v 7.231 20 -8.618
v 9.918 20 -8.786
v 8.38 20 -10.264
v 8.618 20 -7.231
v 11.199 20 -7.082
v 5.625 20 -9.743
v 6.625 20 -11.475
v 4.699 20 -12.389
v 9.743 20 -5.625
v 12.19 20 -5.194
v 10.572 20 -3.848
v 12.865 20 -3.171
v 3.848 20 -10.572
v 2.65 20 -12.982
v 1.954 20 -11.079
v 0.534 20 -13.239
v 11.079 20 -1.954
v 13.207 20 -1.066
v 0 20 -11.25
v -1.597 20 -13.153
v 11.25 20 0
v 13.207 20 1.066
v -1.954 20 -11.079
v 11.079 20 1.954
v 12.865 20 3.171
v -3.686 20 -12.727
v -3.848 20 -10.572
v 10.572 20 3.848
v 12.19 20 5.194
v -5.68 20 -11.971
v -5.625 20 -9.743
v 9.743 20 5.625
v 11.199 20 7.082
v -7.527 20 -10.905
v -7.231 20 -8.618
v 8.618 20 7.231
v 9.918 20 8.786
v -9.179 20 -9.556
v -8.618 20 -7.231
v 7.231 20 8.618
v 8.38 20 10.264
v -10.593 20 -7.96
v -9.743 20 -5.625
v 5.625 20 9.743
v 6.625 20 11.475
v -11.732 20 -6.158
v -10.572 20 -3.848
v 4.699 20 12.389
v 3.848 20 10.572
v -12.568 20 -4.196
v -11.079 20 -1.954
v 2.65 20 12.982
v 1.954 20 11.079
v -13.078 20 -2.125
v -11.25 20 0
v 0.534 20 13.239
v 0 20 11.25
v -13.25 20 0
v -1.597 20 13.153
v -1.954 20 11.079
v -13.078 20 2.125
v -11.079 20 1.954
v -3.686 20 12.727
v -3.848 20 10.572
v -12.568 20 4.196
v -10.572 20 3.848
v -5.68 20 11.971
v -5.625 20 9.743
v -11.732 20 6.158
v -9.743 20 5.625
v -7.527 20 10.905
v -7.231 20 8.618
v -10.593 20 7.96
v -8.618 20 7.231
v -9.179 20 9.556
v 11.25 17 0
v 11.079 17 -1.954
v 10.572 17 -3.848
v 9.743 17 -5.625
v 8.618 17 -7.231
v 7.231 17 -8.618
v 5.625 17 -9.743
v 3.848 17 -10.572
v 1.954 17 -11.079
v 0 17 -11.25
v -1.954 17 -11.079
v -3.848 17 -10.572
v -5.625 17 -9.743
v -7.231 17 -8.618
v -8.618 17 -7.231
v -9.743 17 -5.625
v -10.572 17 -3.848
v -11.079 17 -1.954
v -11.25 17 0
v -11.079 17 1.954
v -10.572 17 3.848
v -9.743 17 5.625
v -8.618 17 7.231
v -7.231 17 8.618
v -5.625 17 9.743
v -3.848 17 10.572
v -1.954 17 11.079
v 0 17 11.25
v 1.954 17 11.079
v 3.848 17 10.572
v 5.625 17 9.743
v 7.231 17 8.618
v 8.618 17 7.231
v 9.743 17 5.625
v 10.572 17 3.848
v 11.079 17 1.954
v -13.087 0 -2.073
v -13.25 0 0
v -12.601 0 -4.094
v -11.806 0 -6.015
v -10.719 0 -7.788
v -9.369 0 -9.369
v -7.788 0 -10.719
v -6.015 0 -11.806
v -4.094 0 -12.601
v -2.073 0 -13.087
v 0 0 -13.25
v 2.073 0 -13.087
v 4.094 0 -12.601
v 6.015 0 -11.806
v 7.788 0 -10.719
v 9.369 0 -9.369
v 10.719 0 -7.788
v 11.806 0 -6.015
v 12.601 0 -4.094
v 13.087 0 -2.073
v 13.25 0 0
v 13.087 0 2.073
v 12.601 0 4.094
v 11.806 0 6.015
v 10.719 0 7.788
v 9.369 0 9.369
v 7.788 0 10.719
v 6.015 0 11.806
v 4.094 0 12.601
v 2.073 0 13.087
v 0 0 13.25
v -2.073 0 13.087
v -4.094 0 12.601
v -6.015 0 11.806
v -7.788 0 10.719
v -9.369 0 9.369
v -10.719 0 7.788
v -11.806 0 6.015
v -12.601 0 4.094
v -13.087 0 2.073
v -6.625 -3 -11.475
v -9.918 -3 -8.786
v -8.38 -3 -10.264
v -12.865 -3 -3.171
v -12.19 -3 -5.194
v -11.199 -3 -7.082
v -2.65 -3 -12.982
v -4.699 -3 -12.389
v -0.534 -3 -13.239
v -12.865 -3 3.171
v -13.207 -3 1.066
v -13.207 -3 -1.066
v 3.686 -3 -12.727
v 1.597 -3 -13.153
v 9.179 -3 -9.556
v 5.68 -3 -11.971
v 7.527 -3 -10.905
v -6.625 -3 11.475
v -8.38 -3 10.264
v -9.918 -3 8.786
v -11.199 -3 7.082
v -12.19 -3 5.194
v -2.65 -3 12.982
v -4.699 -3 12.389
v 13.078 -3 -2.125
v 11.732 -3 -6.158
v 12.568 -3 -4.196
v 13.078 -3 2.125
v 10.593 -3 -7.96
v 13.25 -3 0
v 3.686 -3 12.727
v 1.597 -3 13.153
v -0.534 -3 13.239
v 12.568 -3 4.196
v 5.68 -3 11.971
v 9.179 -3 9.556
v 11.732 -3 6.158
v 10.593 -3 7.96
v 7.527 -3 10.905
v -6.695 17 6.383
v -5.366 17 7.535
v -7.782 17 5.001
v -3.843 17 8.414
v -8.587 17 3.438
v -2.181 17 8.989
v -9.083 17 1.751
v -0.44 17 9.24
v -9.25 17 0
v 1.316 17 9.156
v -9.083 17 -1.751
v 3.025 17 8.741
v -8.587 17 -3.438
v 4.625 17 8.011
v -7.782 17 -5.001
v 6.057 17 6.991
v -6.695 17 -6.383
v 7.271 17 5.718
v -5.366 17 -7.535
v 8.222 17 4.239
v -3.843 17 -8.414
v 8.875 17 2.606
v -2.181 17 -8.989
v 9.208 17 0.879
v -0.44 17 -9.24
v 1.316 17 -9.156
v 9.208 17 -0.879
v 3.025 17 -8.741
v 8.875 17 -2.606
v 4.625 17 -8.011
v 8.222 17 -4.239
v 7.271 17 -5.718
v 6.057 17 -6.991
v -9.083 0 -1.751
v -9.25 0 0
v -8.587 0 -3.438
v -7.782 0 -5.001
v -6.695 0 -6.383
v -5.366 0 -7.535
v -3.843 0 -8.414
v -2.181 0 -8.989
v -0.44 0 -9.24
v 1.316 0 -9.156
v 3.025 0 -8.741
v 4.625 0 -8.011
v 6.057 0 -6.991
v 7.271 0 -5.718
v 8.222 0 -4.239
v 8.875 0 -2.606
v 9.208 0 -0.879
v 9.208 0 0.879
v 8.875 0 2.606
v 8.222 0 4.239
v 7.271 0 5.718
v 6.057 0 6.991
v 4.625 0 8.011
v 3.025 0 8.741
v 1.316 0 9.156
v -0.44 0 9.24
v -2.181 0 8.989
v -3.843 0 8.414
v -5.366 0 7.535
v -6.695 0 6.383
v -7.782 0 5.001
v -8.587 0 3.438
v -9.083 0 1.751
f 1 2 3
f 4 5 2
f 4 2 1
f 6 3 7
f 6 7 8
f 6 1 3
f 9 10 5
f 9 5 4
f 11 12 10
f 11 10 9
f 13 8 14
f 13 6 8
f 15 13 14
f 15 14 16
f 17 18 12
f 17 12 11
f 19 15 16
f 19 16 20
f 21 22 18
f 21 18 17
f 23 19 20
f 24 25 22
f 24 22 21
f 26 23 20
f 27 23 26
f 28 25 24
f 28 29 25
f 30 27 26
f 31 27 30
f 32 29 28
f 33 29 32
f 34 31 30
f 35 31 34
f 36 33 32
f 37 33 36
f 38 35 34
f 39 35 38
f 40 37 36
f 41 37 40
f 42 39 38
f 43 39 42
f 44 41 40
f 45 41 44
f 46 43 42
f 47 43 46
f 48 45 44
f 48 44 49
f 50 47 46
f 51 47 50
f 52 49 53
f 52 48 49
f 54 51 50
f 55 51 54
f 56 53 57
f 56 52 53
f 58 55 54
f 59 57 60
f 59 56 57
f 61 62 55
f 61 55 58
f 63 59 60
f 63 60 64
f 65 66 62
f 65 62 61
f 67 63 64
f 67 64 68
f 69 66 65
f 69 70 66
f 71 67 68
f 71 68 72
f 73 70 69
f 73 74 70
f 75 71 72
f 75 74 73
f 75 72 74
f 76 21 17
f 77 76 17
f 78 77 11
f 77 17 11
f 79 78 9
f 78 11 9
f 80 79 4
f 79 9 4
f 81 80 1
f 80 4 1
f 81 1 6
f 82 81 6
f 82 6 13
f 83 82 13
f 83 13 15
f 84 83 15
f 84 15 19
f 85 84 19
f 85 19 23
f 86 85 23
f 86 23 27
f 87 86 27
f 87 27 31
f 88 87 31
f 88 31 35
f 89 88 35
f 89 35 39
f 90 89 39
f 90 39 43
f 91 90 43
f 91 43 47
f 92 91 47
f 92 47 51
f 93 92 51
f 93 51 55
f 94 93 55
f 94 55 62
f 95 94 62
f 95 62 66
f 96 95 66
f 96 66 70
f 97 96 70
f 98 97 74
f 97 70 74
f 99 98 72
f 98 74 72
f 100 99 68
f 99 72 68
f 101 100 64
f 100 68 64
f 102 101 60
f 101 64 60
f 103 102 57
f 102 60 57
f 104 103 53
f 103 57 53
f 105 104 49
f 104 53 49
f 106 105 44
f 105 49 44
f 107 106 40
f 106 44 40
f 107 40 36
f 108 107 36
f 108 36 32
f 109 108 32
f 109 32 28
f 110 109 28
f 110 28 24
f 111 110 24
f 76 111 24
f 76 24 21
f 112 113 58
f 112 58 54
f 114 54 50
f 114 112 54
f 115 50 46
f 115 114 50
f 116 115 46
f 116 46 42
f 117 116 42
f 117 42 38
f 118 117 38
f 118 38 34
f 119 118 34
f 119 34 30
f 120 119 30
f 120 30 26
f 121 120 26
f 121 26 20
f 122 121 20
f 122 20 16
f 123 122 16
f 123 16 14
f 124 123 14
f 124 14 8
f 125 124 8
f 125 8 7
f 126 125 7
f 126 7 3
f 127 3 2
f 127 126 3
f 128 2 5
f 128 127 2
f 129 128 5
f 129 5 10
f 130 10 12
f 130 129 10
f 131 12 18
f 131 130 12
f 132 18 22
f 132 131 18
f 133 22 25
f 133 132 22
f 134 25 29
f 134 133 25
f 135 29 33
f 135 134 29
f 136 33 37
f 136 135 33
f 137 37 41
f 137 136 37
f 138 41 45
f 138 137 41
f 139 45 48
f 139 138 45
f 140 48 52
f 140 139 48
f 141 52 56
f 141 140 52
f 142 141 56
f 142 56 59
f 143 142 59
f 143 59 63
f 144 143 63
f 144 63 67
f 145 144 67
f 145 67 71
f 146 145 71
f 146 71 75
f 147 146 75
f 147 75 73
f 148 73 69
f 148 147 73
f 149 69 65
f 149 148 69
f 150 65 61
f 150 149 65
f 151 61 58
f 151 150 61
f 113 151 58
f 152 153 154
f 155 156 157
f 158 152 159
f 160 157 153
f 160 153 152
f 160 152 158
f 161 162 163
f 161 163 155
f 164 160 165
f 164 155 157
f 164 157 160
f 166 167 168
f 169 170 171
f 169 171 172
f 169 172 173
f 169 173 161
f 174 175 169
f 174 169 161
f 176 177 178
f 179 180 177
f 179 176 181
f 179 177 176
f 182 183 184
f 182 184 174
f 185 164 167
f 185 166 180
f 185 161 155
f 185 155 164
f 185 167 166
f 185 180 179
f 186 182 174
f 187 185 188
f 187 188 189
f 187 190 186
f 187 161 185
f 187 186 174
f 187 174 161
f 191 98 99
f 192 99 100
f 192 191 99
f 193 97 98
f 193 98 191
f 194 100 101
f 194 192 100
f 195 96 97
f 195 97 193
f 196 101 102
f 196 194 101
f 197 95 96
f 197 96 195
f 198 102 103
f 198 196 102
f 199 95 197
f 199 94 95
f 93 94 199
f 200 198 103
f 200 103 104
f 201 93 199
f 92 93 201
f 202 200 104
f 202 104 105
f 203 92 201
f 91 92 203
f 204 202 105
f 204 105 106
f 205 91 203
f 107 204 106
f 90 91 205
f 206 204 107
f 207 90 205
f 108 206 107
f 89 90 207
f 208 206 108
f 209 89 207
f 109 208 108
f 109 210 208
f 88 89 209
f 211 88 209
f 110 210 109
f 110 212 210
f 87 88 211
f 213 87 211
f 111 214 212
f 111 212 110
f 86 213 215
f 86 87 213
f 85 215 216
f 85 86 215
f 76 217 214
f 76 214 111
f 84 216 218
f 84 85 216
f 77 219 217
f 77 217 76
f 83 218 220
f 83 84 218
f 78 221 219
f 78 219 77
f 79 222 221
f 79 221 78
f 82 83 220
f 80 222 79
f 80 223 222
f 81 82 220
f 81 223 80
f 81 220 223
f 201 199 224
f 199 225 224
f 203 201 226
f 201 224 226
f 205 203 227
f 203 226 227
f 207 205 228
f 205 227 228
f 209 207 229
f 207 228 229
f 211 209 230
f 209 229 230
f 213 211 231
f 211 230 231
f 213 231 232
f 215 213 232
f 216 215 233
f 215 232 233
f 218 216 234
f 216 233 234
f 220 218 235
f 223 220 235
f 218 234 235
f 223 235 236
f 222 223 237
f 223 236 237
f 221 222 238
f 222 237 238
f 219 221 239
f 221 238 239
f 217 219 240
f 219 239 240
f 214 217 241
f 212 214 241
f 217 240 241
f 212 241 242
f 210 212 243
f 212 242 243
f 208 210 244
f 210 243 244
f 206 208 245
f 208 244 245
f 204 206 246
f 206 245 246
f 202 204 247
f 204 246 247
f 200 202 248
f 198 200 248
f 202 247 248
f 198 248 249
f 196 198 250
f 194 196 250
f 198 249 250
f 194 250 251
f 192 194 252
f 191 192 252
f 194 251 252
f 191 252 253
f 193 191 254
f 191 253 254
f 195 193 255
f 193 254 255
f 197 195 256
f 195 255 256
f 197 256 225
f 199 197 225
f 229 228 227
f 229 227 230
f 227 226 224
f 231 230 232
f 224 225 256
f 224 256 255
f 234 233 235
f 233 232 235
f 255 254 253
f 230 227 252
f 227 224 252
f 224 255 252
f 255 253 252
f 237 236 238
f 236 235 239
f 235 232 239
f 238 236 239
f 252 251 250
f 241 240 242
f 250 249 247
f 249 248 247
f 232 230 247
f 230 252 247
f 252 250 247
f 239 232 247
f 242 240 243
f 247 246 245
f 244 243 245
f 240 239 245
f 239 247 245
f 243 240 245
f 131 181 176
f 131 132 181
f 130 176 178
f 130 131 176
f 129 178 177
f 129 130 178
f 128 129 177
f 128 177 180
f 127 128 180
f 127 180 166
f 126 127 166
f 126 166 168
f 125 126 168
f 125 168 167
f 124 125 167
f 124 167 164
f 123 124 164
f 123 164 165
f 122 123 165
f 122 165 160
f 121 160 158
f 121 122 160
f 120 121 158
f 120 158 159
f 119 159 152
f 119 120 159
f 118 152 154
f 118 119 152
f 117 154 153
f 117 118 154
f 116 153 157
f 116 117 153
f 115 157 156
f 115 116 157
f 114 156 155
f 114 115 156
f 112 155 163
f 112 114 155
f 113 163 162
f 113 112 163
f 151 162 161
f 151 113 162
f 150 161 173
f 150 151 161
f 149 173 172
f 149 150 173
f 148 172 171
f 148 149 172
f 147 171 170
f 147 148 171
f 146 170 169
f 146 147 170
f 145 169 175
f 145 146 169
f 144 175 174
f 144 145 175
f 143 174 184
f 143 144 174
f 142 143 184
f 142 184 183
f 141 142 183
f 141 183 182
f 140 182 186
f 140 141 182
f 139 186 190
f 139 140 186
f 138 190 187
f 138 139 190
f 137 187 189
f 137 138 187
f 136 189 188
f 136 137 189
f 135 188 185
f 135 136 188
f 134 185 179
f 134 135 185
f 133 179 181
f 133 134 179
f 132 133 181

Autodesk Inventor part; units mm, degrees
ref_plane "YZ Plane" through (0, 0, 0) normal (1, 0, 0) x (0, 1, 0)
ref_plane "XZ Plane" through (0, 0, 0) normal (0, 1, 0) x (-1, 0, 0)
ref_plane "XY Plane" through (0, 0, 0) normal (0, 0, 1) x (1, 0, 0)
sketch "Sketch1" plane through (0, 0, 0) normal (0, 1, 0) x (-1, 0, 0)
  circle A0 centre (0, 0) radius 9.25
  circle A1 centre (0, 0) radius 13.25
  dimension "d0" = 18.5
  dimension "d1" = 4
extrude "Extrusion1" add sketch "Sketch1" along normal blind 20
sketch "Sketch4" plane through (0, 0, 0) normal (0, -1, 0) x (1, 0, 0)
  circle A0 centre (0, 0) radius 13.25 projected
  circle A1 centre (0, 0) radius 13.25
extrude "Extrusion2" add sketch "Sketch4" along normal blind 3
sketch "Sketch5" plane through (0, 20, 0) normal (0, 1, 0) x (1, 0, 0)
  circle A0 centre (0, 0) radius 9.25 projected
  circle A1 centre (0, 0) radius 11.25
  dimension "d6" = 2
extrude "Extrusion3" cut sketch "Sketch5" against normal blind 3
properties part number "springPusher"
